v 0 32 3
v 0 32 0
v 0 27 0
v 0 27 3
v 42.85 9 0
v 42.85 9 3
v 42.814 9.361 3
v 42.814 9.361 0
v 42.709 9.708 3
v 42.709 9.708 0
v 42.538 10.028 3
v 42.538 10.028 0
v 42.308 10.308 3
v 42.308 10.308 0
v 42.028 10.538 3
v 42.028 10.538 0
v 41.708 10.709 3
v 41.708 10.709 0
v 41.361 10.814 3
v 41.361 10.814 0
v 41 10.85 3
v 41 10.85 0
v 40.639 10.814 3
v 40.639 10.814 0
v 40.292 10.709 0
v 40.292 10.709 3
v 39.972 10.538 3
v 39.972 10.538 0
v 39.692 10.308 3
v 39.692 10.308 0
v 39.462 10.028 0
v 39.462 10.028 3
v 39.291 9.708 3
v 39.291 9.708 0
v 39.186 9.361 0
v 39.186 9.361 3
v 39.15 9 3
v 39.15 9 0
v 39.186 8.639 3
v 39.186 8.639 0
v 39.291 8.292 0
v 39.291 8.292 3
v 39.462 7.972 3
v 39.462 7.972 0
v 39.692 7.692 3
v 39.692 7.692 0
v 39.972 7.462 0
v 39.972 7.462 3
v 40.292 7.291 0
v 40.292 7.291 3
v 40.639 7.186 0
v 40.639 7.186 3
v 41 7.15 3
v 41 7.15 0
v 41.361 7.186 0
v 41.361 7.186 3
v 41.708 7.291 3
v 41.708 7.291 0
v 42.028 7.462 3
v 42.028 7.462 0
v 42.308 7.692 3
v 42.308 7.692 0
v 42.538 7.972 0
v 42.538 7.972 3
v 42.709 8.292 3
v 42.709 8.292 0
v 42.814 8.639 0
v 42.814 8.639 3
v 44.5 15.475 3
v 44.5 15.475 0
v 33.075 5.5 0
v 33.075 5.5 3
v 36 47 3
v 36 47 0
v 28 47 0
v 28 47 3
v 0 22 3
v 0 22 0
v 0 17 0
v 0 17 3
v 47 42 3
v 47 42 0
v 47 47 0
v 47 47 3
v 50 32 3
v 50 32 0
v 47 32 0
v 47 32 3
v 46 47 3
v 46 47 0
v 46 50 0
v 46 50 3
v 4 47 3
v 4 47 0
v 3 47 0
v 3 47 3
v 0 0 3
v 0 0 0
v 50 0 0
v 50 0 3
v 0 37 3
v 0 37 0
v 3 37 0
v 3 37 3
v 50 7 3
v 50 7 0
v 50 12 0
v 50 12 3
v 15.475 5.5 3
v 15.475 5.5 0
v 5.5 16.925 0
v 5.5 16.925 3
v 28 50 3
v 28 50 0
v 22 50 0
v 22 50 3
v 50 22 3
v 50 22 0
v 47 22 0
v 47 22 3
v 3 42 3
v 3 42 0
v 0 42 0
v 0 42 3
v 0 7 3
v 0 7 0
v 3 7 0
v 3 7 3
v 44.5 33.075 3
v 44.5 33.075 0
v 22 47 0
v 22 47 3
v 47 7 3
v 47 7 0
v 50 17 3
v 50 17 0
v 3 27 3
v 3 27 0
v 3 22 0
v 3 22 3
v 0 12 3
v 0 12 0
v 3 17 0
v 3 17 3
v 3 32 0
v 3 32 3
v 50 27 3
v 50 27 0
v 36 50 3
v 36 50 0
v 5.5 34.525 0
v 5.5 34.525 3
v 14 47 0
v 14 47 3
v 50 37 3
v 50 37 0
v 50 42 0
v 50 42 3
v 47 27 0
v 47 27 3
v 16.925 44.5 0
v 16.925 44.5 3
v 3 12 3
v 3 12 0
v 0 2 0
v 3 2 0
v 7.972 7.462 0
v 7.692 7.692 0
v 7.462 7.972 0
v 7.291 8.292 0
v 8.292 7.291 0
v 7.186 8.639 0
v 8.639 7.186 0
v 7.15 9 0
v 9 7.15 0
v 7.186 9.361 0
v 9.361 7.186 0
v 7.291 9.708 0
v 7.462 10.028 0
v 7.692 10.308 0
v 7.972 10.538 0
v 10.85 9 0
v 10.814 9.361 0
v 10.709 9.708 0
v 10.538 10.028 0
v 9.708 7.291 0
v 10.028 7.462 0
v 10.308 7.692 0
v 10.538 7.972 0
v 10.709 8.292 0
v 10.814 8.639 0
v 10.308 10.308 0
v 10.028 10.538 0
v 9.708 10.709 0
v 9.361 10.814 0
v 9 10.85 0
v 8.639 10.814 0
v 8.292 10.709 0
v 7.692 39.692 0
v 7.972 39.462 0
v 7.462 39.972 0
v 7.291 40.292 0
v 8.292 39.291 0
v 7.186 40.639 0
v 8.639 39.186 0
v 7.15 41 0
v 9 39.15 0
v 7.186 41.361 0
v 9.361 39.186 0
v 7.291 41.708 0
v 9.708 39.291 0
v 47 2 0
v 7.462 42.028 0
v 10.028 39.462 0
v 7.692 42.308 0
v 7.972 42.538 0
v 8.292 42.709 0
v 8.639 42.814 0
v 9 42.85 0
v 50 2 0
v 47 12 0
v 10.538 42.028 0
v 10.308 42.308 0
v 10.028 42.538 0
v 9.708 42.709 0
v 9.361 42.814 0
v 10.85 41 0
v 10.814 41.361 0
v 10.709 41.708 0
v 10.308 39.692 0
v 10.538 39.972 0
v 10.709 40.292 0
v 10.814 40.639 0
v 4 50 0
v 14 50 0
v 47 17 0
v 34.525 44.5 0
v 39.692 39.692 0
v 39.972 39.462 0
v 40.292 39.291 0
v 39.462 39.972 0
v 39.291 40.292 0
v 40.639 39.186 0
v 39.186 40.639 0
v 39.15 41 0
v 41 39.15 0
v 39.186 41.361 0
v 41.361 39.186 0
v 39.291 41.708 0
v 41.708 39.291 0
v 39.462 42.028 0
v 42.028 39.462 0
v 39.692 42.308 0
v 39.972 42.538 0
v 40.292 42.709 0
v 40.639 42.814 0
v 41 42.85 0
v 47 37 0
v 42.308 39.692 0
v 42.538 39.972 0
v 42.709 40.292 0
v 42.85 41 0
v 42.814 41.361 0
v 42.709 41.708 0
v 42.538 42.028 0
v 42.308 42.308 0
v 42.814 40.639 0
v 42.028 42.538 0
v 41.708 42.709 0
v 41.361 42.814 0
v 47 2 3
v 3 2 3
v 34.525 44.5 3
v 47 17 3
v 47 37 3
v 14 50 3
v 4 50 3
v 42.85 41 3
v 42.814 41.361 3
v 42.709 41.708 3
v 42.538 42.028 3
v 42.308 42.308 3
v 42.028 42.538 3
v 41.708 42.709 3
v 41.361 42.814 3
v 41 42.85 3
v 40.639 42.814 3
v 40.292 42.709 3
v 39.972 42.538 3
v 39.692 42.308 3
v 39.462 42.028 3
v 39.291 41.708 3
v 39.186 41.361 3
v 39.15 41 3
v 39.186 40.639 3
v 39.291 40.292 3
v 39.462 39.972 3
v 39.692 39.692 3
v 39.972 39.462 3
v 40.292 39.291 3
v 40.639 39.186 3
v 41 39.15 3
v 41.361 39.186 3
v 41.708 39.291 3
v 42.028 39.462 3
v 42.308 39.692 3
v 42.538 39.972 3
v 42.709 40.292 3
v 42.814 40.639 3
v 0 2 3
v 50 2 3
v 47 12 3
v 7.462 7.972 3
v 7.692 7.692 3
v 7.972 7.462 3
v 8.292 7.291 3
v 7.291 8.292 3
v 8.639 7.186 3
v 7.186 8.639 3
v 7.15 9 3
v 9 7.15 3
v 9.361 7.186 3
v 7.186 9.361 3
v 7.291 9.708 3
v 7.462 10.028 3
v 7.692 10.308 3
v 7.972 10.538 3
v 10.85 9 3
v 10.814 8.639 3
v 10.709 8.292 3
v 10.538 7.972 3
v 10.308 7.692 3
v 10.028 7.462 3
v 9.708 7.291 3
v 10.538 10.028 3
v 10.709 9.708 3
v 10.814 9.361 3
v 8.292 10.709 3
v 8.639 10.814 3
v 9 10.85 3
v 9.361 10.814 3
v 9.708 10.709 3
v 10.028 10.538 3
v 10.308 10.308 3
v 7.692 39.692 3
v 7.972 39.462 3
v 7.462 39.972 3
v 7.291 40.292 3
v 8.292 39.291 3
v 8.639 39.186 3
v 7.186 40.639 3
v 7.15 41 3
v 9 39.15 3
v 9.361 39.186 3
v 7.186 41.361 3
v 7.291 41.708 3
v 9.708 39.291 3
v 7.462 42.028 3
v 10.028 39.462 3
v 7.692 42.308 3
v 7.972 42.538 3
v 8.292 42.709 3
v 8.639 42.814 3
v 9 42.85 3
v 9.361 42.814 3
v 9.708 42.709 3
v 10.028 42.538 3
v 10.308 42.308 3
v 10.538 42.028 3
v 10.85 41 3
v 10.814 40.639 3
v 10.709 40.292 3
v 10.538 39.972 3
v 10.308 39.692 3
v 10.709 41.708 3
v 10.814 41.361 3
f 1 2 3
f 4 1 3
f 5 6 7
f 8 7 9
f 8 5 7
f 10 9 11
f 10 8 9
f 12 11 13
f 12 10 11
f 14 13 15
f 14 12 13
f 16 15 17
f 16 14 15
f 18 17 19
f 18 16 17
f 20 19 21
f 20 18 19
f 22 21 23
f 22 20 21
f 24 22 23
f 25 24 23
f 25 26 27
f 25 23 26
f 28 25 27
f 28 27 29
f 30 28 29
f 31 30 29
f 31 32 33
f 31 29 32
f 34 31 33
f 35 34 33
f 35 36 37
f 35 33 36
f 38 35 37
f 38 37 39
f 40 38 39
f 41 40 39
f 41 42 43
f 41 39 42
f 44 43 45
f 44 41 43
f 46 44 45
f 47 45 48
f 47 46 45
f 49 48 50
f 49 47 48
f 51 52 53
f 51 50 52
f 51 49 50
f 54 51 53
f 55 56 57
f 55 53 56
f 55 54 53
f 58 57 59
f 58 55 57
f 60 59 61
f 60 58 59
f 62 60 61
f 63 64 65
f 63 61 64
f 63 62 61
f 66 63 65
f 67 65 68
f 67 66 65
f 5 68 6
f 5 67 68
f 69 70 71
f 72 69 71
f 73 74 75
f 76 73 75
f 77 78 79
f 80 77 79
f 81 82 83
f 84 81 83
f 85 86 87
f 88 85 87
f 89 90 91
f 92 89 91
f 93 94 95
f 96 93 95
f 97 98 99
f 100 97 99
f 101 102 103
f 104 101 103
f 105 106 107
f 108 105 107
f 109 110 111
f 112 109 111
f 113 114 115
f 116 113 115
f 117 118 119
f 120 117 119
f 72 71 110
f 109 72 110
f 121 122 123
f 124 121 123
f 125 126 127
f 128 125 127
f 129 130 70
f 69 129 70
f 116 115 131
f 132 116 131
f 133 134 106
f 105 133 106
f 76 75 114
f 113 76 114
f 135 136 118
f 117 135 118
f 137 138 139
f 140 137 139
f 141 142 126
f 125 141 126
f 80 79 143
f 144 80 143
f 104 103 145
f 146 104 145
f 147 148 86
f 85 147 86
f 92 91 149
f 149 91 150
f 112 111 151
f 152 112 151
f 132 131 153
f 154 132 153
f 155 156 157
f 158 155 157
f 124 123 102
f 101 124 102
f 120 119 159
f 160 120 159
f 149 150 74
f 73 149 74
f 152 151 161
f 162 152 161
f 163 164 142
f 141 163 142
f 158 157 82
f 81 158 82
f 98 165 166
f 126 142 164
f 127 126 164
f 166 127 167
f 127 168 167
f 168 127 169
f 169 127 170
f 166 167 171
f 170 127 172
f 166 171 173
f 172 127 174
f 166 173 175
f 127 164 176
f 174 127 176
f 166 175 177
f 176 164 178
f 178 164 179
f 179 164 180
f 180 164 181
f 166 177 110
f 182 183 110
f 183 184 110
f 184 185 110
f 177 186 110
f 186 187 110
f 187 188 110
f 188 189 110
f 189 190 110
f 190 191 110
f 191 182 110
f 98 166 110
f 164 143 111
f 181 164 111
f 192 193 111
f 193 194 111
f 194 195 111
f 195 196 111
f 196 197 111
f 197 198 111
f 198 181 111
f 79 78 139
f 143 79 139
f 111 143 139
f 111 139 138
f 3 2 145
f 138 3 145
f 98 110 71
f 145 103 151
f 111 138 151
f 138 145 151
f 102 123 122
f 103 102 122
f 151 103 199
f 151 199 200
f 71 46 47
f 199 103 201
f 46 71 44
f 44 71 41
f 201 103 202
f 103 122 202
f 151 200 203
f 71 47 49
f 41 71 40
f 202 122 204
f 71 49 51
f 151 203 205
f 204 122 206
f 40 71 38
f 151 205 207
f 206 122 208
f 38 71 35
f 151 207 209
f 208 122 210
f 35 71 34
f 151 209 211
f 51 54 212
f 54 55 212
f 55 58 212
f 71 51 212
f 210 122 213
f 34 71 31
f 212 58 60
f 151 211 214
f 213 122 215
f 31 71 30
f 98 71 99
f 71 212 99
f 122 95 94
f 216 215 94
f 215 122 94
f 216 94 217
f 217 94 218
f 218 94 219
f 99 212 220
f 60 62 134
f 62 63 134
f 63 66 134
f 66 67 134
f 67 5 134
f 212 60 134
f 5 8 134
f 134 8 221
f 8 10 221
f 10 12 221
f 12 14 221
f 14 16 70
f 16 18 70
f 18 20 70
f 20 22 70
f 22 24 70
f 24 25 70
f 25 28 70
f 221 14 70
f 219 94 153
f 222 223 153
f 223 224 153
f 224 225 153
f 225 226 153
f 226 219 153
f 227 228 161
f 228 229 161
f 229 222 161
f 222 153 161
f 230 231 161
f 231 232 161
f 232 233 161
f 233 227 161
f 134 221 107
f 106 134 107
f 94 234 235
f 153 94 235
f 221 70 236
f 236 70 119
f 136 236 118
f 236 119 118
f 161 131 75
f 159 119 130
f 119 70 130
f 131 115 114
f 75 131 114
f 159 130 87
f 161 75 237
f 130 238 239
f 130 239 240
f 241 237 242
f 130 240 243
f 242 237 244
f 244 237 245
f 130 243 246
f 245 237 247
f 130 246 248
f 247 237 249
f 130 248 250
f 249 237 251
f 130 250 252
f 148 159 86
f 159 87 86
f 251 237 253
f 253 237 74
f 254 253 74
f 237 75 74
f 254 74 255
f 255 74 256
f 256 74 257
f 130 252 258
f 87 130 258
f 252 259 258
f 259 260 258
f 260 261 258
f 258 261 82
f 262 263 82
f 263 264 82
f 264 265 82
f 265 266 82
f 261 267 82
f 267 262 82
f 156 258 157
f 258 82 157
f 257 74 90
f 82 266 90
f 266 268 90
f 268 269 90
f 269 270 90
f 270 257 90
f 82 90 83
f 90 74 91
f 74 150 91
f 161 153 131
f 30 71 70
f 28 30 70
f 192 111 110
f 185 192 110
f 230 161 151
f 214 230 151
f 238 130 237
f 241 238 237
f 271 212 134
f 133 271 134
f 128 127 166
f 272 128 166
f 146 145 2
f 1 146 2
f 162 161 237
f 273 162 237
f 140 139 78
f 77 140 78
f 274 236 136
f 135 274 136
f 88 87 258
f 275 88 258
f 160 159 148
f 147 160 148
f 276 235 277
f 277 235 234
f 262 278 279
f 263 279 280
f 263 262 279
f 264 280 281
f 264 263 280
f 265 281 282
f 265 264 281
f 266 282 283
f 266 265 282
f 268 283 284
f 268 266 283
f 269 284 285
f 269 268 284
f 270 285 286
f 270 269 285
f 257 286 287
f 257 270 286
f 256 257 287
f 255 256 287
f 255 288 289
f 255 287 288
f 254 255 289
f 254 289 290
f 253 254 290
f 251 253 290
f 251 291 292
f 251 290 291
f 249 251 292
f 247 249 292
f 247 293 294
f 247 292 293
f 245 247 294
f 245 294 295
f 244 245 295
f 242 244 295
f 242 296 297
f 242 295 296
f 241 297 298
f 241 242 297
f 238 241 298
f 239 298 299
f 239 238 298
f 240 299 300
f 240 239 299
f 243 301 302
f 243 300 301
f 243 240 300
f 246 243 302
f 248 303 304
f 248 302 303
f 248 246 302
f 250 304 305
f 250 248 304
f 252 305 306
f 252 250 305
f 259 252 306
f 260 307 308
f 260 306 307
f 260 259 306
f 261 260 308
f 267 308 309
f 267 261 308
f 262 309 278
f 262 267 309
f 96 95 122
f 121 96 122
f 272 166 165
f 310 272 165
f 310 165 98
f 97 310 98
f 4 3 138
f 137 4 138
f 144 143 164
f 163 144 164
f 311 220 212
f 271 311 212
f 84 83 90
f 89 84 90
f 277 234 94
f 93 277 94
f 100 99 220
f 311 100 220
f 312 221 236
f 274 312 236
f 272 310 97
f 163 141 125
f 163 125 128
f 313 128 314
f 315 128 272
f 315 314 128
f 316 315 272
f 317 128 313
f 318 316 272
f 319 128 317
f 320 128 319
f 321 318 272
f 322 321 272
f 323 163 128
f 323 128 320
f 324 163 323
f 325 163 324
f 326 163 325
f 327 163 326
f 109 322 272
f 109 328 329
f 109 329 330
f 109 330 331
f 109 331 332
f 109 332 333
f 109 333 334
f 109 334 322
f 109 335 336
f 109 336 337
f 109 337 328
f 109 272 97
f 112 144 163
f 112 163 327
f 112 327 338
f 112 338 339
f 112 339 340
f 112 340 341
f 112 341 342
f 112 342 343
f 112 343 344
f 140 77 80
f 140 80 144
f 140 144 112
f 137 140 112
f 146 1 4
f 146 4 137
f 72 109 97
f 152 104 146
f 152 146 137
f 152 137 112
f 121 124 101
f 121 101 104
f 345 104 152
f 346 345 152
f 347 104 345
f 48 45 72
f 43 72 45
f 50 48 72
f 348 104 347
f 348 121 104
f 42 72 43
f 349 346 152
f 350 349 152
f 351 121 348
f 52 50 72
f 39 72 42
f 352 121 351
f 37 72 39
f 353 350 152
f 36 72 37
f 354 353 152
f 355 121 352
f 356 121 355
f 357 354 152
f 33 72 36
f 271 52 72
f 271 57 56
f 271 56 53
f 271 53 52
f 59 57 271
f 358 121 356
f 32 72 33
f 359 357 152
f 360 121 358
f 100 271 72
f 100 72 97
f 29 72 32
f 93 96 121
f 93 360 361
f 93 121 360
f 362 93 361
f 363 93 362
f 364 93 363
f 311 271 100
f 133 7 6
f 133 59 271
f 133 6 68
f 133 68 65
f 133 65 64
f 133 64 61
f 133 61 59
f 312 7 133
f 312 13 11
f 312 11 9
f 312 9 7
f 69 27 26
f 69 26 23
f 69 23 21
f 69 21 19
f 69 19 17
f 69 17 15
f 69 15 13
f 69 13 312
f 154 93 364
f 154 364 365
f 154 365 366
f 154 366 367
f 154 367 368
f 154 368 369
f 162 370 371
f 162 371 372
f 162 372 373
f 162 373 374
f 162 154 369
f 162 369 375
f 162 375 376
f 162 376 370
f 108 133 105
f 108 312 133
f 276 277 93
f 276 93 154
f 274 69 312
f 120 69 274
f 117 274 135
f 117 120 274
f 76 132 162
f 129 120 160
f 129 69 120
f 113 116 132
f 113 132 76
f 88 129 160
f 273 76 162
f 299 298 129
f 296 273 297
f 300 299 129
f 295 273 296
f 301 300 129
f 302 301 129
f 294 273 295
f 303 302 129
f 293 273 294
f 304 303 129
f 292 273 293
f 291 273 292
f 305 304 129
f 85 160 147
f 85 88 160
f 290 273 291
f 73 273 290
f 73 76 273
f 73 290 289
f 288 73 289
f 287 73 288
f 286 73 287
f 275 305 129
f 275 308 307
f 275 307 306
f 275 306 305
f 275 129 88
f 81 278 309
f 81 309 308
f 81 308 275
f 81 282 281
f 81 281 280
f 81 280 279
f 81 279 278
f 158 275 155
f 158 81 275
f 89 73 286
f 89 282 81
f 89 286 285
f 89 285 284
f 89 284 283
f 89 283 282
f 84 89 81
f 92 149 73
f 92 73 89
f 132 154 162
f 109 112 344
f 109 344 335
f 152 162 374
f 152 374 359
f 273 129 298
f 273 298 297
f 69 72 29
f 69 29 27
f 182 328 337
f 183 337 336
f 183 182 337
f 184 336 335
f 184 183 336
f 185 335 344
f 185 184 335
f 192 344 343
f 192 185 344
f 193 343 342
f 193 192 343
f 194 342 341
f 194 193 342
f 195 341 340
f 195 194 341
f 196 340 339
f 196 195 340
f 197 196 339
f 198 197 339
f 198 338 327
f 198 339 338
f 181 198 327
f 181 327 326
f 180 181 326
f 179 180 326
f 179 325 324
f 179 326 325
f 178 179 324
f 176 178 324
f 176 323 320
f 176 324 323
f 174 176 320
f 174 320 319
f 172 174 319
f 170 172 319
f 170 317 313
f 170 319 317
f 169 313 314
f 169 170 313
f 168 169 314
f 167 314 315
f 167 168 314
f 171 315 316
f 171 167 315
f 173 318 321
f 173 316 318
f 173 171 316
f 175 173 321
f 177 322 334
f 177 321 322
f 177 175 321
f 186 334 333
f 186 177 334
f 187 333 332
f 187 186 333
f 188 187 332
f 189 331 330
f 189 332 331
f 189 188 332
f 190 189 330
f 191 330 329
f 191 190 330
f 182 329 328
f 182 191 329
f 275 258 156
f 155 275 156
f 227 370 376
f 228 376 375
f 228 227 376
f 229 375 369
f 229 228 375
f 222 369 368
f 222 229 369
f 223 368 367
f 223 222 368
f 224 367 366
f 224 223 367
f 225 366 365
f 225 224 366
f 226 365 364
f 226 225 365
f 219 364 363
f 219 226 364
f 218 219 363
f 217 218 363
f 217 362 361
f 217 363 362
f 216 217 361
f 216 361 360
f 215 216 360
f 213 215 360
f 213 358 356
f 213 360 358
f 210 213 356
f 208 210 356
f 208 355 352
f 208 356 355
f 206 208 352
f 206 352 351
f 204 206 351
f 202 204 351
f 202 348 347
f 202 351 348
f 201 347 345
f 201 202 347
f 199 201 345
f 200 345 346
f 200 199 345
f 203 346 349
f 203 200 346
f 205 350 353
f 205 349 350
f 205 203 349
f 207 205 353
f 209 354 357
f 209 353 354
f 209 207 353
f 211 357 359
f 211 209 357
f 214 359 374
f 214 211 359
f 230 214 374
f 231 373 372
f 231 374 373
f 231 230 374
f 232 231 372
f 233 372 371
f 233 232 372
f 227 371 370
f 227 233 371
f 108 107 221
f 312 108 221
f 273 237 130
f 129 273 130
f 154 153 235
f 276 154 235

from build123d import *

# Parameters (mm, degrees)
BOSS_EXTRUDE1_DEPTH = 3
SKETCH2_R           = 1.85
CUT_EXTRUDE1_DEPTH  = 71.774289117


with BuildPart() as part:
    # Sketch1 → Boss-Extrude1 (new body)
    with BuildSketch(Plane.XY):
        Polygon((14, 50), (4, 50), (4, 47), (3, 47), (3, 42), (0, 42), (0, 37), (3, 37), (3, 32), (0, 32), (0, 27), (3, 27), (3, 22), (0, 22), (0, 17), (3, 17), (3, 12), (0, 12), (0, 7), (3, 7), (3, 2), (0, 2), (0, 0), (50, 0), (50, 2), (47, 2), (47, 7), (50, 7), (50, 12), (47, 12), (47, 17), (50, 17), (50, 22), (47, 22), (47, 27), (50, 27), (50, 32), (47, 32), (47, 37), (50, 37), (50, 42), (47, 42), (47, 47), (46, 47), (46, 50), (36, 50), (36, 47), (28, 47), (28, 50), (22, 50), (22, 47), (14, 47), align=None)
    extrude(amount=BOSS_EXTRUDE1_DEPTH)

    # Sketch2 → Cut-Extrude1 (cut, through all)
    with BuildSketch(Plane.XY):
        with Locations((9, 41)):
            Circle(SKETCH2_R)
        with Locations((41, 41)):
            Circle(SKETCH2_R)
        with Locations((41, 9)):
            Circle(SKETCH2_R)
        with Locations((9, 9)):
            Circle(SKETCH2_R)
        Polygon((33.074995027, 5.5), (15.474995027, 5.5), (5.5, 16.925004973), (5.5, 34.525004973), (16.925004973, 44.5), (34.525004973, 44.5), (44.5, 33.074995027), (44.5, 15.474995027), align=None)
    extrude(amount=CUT_EXTRUDE1_DEPTH, mode=Mode.SUBTRACT)


solid = part.part
